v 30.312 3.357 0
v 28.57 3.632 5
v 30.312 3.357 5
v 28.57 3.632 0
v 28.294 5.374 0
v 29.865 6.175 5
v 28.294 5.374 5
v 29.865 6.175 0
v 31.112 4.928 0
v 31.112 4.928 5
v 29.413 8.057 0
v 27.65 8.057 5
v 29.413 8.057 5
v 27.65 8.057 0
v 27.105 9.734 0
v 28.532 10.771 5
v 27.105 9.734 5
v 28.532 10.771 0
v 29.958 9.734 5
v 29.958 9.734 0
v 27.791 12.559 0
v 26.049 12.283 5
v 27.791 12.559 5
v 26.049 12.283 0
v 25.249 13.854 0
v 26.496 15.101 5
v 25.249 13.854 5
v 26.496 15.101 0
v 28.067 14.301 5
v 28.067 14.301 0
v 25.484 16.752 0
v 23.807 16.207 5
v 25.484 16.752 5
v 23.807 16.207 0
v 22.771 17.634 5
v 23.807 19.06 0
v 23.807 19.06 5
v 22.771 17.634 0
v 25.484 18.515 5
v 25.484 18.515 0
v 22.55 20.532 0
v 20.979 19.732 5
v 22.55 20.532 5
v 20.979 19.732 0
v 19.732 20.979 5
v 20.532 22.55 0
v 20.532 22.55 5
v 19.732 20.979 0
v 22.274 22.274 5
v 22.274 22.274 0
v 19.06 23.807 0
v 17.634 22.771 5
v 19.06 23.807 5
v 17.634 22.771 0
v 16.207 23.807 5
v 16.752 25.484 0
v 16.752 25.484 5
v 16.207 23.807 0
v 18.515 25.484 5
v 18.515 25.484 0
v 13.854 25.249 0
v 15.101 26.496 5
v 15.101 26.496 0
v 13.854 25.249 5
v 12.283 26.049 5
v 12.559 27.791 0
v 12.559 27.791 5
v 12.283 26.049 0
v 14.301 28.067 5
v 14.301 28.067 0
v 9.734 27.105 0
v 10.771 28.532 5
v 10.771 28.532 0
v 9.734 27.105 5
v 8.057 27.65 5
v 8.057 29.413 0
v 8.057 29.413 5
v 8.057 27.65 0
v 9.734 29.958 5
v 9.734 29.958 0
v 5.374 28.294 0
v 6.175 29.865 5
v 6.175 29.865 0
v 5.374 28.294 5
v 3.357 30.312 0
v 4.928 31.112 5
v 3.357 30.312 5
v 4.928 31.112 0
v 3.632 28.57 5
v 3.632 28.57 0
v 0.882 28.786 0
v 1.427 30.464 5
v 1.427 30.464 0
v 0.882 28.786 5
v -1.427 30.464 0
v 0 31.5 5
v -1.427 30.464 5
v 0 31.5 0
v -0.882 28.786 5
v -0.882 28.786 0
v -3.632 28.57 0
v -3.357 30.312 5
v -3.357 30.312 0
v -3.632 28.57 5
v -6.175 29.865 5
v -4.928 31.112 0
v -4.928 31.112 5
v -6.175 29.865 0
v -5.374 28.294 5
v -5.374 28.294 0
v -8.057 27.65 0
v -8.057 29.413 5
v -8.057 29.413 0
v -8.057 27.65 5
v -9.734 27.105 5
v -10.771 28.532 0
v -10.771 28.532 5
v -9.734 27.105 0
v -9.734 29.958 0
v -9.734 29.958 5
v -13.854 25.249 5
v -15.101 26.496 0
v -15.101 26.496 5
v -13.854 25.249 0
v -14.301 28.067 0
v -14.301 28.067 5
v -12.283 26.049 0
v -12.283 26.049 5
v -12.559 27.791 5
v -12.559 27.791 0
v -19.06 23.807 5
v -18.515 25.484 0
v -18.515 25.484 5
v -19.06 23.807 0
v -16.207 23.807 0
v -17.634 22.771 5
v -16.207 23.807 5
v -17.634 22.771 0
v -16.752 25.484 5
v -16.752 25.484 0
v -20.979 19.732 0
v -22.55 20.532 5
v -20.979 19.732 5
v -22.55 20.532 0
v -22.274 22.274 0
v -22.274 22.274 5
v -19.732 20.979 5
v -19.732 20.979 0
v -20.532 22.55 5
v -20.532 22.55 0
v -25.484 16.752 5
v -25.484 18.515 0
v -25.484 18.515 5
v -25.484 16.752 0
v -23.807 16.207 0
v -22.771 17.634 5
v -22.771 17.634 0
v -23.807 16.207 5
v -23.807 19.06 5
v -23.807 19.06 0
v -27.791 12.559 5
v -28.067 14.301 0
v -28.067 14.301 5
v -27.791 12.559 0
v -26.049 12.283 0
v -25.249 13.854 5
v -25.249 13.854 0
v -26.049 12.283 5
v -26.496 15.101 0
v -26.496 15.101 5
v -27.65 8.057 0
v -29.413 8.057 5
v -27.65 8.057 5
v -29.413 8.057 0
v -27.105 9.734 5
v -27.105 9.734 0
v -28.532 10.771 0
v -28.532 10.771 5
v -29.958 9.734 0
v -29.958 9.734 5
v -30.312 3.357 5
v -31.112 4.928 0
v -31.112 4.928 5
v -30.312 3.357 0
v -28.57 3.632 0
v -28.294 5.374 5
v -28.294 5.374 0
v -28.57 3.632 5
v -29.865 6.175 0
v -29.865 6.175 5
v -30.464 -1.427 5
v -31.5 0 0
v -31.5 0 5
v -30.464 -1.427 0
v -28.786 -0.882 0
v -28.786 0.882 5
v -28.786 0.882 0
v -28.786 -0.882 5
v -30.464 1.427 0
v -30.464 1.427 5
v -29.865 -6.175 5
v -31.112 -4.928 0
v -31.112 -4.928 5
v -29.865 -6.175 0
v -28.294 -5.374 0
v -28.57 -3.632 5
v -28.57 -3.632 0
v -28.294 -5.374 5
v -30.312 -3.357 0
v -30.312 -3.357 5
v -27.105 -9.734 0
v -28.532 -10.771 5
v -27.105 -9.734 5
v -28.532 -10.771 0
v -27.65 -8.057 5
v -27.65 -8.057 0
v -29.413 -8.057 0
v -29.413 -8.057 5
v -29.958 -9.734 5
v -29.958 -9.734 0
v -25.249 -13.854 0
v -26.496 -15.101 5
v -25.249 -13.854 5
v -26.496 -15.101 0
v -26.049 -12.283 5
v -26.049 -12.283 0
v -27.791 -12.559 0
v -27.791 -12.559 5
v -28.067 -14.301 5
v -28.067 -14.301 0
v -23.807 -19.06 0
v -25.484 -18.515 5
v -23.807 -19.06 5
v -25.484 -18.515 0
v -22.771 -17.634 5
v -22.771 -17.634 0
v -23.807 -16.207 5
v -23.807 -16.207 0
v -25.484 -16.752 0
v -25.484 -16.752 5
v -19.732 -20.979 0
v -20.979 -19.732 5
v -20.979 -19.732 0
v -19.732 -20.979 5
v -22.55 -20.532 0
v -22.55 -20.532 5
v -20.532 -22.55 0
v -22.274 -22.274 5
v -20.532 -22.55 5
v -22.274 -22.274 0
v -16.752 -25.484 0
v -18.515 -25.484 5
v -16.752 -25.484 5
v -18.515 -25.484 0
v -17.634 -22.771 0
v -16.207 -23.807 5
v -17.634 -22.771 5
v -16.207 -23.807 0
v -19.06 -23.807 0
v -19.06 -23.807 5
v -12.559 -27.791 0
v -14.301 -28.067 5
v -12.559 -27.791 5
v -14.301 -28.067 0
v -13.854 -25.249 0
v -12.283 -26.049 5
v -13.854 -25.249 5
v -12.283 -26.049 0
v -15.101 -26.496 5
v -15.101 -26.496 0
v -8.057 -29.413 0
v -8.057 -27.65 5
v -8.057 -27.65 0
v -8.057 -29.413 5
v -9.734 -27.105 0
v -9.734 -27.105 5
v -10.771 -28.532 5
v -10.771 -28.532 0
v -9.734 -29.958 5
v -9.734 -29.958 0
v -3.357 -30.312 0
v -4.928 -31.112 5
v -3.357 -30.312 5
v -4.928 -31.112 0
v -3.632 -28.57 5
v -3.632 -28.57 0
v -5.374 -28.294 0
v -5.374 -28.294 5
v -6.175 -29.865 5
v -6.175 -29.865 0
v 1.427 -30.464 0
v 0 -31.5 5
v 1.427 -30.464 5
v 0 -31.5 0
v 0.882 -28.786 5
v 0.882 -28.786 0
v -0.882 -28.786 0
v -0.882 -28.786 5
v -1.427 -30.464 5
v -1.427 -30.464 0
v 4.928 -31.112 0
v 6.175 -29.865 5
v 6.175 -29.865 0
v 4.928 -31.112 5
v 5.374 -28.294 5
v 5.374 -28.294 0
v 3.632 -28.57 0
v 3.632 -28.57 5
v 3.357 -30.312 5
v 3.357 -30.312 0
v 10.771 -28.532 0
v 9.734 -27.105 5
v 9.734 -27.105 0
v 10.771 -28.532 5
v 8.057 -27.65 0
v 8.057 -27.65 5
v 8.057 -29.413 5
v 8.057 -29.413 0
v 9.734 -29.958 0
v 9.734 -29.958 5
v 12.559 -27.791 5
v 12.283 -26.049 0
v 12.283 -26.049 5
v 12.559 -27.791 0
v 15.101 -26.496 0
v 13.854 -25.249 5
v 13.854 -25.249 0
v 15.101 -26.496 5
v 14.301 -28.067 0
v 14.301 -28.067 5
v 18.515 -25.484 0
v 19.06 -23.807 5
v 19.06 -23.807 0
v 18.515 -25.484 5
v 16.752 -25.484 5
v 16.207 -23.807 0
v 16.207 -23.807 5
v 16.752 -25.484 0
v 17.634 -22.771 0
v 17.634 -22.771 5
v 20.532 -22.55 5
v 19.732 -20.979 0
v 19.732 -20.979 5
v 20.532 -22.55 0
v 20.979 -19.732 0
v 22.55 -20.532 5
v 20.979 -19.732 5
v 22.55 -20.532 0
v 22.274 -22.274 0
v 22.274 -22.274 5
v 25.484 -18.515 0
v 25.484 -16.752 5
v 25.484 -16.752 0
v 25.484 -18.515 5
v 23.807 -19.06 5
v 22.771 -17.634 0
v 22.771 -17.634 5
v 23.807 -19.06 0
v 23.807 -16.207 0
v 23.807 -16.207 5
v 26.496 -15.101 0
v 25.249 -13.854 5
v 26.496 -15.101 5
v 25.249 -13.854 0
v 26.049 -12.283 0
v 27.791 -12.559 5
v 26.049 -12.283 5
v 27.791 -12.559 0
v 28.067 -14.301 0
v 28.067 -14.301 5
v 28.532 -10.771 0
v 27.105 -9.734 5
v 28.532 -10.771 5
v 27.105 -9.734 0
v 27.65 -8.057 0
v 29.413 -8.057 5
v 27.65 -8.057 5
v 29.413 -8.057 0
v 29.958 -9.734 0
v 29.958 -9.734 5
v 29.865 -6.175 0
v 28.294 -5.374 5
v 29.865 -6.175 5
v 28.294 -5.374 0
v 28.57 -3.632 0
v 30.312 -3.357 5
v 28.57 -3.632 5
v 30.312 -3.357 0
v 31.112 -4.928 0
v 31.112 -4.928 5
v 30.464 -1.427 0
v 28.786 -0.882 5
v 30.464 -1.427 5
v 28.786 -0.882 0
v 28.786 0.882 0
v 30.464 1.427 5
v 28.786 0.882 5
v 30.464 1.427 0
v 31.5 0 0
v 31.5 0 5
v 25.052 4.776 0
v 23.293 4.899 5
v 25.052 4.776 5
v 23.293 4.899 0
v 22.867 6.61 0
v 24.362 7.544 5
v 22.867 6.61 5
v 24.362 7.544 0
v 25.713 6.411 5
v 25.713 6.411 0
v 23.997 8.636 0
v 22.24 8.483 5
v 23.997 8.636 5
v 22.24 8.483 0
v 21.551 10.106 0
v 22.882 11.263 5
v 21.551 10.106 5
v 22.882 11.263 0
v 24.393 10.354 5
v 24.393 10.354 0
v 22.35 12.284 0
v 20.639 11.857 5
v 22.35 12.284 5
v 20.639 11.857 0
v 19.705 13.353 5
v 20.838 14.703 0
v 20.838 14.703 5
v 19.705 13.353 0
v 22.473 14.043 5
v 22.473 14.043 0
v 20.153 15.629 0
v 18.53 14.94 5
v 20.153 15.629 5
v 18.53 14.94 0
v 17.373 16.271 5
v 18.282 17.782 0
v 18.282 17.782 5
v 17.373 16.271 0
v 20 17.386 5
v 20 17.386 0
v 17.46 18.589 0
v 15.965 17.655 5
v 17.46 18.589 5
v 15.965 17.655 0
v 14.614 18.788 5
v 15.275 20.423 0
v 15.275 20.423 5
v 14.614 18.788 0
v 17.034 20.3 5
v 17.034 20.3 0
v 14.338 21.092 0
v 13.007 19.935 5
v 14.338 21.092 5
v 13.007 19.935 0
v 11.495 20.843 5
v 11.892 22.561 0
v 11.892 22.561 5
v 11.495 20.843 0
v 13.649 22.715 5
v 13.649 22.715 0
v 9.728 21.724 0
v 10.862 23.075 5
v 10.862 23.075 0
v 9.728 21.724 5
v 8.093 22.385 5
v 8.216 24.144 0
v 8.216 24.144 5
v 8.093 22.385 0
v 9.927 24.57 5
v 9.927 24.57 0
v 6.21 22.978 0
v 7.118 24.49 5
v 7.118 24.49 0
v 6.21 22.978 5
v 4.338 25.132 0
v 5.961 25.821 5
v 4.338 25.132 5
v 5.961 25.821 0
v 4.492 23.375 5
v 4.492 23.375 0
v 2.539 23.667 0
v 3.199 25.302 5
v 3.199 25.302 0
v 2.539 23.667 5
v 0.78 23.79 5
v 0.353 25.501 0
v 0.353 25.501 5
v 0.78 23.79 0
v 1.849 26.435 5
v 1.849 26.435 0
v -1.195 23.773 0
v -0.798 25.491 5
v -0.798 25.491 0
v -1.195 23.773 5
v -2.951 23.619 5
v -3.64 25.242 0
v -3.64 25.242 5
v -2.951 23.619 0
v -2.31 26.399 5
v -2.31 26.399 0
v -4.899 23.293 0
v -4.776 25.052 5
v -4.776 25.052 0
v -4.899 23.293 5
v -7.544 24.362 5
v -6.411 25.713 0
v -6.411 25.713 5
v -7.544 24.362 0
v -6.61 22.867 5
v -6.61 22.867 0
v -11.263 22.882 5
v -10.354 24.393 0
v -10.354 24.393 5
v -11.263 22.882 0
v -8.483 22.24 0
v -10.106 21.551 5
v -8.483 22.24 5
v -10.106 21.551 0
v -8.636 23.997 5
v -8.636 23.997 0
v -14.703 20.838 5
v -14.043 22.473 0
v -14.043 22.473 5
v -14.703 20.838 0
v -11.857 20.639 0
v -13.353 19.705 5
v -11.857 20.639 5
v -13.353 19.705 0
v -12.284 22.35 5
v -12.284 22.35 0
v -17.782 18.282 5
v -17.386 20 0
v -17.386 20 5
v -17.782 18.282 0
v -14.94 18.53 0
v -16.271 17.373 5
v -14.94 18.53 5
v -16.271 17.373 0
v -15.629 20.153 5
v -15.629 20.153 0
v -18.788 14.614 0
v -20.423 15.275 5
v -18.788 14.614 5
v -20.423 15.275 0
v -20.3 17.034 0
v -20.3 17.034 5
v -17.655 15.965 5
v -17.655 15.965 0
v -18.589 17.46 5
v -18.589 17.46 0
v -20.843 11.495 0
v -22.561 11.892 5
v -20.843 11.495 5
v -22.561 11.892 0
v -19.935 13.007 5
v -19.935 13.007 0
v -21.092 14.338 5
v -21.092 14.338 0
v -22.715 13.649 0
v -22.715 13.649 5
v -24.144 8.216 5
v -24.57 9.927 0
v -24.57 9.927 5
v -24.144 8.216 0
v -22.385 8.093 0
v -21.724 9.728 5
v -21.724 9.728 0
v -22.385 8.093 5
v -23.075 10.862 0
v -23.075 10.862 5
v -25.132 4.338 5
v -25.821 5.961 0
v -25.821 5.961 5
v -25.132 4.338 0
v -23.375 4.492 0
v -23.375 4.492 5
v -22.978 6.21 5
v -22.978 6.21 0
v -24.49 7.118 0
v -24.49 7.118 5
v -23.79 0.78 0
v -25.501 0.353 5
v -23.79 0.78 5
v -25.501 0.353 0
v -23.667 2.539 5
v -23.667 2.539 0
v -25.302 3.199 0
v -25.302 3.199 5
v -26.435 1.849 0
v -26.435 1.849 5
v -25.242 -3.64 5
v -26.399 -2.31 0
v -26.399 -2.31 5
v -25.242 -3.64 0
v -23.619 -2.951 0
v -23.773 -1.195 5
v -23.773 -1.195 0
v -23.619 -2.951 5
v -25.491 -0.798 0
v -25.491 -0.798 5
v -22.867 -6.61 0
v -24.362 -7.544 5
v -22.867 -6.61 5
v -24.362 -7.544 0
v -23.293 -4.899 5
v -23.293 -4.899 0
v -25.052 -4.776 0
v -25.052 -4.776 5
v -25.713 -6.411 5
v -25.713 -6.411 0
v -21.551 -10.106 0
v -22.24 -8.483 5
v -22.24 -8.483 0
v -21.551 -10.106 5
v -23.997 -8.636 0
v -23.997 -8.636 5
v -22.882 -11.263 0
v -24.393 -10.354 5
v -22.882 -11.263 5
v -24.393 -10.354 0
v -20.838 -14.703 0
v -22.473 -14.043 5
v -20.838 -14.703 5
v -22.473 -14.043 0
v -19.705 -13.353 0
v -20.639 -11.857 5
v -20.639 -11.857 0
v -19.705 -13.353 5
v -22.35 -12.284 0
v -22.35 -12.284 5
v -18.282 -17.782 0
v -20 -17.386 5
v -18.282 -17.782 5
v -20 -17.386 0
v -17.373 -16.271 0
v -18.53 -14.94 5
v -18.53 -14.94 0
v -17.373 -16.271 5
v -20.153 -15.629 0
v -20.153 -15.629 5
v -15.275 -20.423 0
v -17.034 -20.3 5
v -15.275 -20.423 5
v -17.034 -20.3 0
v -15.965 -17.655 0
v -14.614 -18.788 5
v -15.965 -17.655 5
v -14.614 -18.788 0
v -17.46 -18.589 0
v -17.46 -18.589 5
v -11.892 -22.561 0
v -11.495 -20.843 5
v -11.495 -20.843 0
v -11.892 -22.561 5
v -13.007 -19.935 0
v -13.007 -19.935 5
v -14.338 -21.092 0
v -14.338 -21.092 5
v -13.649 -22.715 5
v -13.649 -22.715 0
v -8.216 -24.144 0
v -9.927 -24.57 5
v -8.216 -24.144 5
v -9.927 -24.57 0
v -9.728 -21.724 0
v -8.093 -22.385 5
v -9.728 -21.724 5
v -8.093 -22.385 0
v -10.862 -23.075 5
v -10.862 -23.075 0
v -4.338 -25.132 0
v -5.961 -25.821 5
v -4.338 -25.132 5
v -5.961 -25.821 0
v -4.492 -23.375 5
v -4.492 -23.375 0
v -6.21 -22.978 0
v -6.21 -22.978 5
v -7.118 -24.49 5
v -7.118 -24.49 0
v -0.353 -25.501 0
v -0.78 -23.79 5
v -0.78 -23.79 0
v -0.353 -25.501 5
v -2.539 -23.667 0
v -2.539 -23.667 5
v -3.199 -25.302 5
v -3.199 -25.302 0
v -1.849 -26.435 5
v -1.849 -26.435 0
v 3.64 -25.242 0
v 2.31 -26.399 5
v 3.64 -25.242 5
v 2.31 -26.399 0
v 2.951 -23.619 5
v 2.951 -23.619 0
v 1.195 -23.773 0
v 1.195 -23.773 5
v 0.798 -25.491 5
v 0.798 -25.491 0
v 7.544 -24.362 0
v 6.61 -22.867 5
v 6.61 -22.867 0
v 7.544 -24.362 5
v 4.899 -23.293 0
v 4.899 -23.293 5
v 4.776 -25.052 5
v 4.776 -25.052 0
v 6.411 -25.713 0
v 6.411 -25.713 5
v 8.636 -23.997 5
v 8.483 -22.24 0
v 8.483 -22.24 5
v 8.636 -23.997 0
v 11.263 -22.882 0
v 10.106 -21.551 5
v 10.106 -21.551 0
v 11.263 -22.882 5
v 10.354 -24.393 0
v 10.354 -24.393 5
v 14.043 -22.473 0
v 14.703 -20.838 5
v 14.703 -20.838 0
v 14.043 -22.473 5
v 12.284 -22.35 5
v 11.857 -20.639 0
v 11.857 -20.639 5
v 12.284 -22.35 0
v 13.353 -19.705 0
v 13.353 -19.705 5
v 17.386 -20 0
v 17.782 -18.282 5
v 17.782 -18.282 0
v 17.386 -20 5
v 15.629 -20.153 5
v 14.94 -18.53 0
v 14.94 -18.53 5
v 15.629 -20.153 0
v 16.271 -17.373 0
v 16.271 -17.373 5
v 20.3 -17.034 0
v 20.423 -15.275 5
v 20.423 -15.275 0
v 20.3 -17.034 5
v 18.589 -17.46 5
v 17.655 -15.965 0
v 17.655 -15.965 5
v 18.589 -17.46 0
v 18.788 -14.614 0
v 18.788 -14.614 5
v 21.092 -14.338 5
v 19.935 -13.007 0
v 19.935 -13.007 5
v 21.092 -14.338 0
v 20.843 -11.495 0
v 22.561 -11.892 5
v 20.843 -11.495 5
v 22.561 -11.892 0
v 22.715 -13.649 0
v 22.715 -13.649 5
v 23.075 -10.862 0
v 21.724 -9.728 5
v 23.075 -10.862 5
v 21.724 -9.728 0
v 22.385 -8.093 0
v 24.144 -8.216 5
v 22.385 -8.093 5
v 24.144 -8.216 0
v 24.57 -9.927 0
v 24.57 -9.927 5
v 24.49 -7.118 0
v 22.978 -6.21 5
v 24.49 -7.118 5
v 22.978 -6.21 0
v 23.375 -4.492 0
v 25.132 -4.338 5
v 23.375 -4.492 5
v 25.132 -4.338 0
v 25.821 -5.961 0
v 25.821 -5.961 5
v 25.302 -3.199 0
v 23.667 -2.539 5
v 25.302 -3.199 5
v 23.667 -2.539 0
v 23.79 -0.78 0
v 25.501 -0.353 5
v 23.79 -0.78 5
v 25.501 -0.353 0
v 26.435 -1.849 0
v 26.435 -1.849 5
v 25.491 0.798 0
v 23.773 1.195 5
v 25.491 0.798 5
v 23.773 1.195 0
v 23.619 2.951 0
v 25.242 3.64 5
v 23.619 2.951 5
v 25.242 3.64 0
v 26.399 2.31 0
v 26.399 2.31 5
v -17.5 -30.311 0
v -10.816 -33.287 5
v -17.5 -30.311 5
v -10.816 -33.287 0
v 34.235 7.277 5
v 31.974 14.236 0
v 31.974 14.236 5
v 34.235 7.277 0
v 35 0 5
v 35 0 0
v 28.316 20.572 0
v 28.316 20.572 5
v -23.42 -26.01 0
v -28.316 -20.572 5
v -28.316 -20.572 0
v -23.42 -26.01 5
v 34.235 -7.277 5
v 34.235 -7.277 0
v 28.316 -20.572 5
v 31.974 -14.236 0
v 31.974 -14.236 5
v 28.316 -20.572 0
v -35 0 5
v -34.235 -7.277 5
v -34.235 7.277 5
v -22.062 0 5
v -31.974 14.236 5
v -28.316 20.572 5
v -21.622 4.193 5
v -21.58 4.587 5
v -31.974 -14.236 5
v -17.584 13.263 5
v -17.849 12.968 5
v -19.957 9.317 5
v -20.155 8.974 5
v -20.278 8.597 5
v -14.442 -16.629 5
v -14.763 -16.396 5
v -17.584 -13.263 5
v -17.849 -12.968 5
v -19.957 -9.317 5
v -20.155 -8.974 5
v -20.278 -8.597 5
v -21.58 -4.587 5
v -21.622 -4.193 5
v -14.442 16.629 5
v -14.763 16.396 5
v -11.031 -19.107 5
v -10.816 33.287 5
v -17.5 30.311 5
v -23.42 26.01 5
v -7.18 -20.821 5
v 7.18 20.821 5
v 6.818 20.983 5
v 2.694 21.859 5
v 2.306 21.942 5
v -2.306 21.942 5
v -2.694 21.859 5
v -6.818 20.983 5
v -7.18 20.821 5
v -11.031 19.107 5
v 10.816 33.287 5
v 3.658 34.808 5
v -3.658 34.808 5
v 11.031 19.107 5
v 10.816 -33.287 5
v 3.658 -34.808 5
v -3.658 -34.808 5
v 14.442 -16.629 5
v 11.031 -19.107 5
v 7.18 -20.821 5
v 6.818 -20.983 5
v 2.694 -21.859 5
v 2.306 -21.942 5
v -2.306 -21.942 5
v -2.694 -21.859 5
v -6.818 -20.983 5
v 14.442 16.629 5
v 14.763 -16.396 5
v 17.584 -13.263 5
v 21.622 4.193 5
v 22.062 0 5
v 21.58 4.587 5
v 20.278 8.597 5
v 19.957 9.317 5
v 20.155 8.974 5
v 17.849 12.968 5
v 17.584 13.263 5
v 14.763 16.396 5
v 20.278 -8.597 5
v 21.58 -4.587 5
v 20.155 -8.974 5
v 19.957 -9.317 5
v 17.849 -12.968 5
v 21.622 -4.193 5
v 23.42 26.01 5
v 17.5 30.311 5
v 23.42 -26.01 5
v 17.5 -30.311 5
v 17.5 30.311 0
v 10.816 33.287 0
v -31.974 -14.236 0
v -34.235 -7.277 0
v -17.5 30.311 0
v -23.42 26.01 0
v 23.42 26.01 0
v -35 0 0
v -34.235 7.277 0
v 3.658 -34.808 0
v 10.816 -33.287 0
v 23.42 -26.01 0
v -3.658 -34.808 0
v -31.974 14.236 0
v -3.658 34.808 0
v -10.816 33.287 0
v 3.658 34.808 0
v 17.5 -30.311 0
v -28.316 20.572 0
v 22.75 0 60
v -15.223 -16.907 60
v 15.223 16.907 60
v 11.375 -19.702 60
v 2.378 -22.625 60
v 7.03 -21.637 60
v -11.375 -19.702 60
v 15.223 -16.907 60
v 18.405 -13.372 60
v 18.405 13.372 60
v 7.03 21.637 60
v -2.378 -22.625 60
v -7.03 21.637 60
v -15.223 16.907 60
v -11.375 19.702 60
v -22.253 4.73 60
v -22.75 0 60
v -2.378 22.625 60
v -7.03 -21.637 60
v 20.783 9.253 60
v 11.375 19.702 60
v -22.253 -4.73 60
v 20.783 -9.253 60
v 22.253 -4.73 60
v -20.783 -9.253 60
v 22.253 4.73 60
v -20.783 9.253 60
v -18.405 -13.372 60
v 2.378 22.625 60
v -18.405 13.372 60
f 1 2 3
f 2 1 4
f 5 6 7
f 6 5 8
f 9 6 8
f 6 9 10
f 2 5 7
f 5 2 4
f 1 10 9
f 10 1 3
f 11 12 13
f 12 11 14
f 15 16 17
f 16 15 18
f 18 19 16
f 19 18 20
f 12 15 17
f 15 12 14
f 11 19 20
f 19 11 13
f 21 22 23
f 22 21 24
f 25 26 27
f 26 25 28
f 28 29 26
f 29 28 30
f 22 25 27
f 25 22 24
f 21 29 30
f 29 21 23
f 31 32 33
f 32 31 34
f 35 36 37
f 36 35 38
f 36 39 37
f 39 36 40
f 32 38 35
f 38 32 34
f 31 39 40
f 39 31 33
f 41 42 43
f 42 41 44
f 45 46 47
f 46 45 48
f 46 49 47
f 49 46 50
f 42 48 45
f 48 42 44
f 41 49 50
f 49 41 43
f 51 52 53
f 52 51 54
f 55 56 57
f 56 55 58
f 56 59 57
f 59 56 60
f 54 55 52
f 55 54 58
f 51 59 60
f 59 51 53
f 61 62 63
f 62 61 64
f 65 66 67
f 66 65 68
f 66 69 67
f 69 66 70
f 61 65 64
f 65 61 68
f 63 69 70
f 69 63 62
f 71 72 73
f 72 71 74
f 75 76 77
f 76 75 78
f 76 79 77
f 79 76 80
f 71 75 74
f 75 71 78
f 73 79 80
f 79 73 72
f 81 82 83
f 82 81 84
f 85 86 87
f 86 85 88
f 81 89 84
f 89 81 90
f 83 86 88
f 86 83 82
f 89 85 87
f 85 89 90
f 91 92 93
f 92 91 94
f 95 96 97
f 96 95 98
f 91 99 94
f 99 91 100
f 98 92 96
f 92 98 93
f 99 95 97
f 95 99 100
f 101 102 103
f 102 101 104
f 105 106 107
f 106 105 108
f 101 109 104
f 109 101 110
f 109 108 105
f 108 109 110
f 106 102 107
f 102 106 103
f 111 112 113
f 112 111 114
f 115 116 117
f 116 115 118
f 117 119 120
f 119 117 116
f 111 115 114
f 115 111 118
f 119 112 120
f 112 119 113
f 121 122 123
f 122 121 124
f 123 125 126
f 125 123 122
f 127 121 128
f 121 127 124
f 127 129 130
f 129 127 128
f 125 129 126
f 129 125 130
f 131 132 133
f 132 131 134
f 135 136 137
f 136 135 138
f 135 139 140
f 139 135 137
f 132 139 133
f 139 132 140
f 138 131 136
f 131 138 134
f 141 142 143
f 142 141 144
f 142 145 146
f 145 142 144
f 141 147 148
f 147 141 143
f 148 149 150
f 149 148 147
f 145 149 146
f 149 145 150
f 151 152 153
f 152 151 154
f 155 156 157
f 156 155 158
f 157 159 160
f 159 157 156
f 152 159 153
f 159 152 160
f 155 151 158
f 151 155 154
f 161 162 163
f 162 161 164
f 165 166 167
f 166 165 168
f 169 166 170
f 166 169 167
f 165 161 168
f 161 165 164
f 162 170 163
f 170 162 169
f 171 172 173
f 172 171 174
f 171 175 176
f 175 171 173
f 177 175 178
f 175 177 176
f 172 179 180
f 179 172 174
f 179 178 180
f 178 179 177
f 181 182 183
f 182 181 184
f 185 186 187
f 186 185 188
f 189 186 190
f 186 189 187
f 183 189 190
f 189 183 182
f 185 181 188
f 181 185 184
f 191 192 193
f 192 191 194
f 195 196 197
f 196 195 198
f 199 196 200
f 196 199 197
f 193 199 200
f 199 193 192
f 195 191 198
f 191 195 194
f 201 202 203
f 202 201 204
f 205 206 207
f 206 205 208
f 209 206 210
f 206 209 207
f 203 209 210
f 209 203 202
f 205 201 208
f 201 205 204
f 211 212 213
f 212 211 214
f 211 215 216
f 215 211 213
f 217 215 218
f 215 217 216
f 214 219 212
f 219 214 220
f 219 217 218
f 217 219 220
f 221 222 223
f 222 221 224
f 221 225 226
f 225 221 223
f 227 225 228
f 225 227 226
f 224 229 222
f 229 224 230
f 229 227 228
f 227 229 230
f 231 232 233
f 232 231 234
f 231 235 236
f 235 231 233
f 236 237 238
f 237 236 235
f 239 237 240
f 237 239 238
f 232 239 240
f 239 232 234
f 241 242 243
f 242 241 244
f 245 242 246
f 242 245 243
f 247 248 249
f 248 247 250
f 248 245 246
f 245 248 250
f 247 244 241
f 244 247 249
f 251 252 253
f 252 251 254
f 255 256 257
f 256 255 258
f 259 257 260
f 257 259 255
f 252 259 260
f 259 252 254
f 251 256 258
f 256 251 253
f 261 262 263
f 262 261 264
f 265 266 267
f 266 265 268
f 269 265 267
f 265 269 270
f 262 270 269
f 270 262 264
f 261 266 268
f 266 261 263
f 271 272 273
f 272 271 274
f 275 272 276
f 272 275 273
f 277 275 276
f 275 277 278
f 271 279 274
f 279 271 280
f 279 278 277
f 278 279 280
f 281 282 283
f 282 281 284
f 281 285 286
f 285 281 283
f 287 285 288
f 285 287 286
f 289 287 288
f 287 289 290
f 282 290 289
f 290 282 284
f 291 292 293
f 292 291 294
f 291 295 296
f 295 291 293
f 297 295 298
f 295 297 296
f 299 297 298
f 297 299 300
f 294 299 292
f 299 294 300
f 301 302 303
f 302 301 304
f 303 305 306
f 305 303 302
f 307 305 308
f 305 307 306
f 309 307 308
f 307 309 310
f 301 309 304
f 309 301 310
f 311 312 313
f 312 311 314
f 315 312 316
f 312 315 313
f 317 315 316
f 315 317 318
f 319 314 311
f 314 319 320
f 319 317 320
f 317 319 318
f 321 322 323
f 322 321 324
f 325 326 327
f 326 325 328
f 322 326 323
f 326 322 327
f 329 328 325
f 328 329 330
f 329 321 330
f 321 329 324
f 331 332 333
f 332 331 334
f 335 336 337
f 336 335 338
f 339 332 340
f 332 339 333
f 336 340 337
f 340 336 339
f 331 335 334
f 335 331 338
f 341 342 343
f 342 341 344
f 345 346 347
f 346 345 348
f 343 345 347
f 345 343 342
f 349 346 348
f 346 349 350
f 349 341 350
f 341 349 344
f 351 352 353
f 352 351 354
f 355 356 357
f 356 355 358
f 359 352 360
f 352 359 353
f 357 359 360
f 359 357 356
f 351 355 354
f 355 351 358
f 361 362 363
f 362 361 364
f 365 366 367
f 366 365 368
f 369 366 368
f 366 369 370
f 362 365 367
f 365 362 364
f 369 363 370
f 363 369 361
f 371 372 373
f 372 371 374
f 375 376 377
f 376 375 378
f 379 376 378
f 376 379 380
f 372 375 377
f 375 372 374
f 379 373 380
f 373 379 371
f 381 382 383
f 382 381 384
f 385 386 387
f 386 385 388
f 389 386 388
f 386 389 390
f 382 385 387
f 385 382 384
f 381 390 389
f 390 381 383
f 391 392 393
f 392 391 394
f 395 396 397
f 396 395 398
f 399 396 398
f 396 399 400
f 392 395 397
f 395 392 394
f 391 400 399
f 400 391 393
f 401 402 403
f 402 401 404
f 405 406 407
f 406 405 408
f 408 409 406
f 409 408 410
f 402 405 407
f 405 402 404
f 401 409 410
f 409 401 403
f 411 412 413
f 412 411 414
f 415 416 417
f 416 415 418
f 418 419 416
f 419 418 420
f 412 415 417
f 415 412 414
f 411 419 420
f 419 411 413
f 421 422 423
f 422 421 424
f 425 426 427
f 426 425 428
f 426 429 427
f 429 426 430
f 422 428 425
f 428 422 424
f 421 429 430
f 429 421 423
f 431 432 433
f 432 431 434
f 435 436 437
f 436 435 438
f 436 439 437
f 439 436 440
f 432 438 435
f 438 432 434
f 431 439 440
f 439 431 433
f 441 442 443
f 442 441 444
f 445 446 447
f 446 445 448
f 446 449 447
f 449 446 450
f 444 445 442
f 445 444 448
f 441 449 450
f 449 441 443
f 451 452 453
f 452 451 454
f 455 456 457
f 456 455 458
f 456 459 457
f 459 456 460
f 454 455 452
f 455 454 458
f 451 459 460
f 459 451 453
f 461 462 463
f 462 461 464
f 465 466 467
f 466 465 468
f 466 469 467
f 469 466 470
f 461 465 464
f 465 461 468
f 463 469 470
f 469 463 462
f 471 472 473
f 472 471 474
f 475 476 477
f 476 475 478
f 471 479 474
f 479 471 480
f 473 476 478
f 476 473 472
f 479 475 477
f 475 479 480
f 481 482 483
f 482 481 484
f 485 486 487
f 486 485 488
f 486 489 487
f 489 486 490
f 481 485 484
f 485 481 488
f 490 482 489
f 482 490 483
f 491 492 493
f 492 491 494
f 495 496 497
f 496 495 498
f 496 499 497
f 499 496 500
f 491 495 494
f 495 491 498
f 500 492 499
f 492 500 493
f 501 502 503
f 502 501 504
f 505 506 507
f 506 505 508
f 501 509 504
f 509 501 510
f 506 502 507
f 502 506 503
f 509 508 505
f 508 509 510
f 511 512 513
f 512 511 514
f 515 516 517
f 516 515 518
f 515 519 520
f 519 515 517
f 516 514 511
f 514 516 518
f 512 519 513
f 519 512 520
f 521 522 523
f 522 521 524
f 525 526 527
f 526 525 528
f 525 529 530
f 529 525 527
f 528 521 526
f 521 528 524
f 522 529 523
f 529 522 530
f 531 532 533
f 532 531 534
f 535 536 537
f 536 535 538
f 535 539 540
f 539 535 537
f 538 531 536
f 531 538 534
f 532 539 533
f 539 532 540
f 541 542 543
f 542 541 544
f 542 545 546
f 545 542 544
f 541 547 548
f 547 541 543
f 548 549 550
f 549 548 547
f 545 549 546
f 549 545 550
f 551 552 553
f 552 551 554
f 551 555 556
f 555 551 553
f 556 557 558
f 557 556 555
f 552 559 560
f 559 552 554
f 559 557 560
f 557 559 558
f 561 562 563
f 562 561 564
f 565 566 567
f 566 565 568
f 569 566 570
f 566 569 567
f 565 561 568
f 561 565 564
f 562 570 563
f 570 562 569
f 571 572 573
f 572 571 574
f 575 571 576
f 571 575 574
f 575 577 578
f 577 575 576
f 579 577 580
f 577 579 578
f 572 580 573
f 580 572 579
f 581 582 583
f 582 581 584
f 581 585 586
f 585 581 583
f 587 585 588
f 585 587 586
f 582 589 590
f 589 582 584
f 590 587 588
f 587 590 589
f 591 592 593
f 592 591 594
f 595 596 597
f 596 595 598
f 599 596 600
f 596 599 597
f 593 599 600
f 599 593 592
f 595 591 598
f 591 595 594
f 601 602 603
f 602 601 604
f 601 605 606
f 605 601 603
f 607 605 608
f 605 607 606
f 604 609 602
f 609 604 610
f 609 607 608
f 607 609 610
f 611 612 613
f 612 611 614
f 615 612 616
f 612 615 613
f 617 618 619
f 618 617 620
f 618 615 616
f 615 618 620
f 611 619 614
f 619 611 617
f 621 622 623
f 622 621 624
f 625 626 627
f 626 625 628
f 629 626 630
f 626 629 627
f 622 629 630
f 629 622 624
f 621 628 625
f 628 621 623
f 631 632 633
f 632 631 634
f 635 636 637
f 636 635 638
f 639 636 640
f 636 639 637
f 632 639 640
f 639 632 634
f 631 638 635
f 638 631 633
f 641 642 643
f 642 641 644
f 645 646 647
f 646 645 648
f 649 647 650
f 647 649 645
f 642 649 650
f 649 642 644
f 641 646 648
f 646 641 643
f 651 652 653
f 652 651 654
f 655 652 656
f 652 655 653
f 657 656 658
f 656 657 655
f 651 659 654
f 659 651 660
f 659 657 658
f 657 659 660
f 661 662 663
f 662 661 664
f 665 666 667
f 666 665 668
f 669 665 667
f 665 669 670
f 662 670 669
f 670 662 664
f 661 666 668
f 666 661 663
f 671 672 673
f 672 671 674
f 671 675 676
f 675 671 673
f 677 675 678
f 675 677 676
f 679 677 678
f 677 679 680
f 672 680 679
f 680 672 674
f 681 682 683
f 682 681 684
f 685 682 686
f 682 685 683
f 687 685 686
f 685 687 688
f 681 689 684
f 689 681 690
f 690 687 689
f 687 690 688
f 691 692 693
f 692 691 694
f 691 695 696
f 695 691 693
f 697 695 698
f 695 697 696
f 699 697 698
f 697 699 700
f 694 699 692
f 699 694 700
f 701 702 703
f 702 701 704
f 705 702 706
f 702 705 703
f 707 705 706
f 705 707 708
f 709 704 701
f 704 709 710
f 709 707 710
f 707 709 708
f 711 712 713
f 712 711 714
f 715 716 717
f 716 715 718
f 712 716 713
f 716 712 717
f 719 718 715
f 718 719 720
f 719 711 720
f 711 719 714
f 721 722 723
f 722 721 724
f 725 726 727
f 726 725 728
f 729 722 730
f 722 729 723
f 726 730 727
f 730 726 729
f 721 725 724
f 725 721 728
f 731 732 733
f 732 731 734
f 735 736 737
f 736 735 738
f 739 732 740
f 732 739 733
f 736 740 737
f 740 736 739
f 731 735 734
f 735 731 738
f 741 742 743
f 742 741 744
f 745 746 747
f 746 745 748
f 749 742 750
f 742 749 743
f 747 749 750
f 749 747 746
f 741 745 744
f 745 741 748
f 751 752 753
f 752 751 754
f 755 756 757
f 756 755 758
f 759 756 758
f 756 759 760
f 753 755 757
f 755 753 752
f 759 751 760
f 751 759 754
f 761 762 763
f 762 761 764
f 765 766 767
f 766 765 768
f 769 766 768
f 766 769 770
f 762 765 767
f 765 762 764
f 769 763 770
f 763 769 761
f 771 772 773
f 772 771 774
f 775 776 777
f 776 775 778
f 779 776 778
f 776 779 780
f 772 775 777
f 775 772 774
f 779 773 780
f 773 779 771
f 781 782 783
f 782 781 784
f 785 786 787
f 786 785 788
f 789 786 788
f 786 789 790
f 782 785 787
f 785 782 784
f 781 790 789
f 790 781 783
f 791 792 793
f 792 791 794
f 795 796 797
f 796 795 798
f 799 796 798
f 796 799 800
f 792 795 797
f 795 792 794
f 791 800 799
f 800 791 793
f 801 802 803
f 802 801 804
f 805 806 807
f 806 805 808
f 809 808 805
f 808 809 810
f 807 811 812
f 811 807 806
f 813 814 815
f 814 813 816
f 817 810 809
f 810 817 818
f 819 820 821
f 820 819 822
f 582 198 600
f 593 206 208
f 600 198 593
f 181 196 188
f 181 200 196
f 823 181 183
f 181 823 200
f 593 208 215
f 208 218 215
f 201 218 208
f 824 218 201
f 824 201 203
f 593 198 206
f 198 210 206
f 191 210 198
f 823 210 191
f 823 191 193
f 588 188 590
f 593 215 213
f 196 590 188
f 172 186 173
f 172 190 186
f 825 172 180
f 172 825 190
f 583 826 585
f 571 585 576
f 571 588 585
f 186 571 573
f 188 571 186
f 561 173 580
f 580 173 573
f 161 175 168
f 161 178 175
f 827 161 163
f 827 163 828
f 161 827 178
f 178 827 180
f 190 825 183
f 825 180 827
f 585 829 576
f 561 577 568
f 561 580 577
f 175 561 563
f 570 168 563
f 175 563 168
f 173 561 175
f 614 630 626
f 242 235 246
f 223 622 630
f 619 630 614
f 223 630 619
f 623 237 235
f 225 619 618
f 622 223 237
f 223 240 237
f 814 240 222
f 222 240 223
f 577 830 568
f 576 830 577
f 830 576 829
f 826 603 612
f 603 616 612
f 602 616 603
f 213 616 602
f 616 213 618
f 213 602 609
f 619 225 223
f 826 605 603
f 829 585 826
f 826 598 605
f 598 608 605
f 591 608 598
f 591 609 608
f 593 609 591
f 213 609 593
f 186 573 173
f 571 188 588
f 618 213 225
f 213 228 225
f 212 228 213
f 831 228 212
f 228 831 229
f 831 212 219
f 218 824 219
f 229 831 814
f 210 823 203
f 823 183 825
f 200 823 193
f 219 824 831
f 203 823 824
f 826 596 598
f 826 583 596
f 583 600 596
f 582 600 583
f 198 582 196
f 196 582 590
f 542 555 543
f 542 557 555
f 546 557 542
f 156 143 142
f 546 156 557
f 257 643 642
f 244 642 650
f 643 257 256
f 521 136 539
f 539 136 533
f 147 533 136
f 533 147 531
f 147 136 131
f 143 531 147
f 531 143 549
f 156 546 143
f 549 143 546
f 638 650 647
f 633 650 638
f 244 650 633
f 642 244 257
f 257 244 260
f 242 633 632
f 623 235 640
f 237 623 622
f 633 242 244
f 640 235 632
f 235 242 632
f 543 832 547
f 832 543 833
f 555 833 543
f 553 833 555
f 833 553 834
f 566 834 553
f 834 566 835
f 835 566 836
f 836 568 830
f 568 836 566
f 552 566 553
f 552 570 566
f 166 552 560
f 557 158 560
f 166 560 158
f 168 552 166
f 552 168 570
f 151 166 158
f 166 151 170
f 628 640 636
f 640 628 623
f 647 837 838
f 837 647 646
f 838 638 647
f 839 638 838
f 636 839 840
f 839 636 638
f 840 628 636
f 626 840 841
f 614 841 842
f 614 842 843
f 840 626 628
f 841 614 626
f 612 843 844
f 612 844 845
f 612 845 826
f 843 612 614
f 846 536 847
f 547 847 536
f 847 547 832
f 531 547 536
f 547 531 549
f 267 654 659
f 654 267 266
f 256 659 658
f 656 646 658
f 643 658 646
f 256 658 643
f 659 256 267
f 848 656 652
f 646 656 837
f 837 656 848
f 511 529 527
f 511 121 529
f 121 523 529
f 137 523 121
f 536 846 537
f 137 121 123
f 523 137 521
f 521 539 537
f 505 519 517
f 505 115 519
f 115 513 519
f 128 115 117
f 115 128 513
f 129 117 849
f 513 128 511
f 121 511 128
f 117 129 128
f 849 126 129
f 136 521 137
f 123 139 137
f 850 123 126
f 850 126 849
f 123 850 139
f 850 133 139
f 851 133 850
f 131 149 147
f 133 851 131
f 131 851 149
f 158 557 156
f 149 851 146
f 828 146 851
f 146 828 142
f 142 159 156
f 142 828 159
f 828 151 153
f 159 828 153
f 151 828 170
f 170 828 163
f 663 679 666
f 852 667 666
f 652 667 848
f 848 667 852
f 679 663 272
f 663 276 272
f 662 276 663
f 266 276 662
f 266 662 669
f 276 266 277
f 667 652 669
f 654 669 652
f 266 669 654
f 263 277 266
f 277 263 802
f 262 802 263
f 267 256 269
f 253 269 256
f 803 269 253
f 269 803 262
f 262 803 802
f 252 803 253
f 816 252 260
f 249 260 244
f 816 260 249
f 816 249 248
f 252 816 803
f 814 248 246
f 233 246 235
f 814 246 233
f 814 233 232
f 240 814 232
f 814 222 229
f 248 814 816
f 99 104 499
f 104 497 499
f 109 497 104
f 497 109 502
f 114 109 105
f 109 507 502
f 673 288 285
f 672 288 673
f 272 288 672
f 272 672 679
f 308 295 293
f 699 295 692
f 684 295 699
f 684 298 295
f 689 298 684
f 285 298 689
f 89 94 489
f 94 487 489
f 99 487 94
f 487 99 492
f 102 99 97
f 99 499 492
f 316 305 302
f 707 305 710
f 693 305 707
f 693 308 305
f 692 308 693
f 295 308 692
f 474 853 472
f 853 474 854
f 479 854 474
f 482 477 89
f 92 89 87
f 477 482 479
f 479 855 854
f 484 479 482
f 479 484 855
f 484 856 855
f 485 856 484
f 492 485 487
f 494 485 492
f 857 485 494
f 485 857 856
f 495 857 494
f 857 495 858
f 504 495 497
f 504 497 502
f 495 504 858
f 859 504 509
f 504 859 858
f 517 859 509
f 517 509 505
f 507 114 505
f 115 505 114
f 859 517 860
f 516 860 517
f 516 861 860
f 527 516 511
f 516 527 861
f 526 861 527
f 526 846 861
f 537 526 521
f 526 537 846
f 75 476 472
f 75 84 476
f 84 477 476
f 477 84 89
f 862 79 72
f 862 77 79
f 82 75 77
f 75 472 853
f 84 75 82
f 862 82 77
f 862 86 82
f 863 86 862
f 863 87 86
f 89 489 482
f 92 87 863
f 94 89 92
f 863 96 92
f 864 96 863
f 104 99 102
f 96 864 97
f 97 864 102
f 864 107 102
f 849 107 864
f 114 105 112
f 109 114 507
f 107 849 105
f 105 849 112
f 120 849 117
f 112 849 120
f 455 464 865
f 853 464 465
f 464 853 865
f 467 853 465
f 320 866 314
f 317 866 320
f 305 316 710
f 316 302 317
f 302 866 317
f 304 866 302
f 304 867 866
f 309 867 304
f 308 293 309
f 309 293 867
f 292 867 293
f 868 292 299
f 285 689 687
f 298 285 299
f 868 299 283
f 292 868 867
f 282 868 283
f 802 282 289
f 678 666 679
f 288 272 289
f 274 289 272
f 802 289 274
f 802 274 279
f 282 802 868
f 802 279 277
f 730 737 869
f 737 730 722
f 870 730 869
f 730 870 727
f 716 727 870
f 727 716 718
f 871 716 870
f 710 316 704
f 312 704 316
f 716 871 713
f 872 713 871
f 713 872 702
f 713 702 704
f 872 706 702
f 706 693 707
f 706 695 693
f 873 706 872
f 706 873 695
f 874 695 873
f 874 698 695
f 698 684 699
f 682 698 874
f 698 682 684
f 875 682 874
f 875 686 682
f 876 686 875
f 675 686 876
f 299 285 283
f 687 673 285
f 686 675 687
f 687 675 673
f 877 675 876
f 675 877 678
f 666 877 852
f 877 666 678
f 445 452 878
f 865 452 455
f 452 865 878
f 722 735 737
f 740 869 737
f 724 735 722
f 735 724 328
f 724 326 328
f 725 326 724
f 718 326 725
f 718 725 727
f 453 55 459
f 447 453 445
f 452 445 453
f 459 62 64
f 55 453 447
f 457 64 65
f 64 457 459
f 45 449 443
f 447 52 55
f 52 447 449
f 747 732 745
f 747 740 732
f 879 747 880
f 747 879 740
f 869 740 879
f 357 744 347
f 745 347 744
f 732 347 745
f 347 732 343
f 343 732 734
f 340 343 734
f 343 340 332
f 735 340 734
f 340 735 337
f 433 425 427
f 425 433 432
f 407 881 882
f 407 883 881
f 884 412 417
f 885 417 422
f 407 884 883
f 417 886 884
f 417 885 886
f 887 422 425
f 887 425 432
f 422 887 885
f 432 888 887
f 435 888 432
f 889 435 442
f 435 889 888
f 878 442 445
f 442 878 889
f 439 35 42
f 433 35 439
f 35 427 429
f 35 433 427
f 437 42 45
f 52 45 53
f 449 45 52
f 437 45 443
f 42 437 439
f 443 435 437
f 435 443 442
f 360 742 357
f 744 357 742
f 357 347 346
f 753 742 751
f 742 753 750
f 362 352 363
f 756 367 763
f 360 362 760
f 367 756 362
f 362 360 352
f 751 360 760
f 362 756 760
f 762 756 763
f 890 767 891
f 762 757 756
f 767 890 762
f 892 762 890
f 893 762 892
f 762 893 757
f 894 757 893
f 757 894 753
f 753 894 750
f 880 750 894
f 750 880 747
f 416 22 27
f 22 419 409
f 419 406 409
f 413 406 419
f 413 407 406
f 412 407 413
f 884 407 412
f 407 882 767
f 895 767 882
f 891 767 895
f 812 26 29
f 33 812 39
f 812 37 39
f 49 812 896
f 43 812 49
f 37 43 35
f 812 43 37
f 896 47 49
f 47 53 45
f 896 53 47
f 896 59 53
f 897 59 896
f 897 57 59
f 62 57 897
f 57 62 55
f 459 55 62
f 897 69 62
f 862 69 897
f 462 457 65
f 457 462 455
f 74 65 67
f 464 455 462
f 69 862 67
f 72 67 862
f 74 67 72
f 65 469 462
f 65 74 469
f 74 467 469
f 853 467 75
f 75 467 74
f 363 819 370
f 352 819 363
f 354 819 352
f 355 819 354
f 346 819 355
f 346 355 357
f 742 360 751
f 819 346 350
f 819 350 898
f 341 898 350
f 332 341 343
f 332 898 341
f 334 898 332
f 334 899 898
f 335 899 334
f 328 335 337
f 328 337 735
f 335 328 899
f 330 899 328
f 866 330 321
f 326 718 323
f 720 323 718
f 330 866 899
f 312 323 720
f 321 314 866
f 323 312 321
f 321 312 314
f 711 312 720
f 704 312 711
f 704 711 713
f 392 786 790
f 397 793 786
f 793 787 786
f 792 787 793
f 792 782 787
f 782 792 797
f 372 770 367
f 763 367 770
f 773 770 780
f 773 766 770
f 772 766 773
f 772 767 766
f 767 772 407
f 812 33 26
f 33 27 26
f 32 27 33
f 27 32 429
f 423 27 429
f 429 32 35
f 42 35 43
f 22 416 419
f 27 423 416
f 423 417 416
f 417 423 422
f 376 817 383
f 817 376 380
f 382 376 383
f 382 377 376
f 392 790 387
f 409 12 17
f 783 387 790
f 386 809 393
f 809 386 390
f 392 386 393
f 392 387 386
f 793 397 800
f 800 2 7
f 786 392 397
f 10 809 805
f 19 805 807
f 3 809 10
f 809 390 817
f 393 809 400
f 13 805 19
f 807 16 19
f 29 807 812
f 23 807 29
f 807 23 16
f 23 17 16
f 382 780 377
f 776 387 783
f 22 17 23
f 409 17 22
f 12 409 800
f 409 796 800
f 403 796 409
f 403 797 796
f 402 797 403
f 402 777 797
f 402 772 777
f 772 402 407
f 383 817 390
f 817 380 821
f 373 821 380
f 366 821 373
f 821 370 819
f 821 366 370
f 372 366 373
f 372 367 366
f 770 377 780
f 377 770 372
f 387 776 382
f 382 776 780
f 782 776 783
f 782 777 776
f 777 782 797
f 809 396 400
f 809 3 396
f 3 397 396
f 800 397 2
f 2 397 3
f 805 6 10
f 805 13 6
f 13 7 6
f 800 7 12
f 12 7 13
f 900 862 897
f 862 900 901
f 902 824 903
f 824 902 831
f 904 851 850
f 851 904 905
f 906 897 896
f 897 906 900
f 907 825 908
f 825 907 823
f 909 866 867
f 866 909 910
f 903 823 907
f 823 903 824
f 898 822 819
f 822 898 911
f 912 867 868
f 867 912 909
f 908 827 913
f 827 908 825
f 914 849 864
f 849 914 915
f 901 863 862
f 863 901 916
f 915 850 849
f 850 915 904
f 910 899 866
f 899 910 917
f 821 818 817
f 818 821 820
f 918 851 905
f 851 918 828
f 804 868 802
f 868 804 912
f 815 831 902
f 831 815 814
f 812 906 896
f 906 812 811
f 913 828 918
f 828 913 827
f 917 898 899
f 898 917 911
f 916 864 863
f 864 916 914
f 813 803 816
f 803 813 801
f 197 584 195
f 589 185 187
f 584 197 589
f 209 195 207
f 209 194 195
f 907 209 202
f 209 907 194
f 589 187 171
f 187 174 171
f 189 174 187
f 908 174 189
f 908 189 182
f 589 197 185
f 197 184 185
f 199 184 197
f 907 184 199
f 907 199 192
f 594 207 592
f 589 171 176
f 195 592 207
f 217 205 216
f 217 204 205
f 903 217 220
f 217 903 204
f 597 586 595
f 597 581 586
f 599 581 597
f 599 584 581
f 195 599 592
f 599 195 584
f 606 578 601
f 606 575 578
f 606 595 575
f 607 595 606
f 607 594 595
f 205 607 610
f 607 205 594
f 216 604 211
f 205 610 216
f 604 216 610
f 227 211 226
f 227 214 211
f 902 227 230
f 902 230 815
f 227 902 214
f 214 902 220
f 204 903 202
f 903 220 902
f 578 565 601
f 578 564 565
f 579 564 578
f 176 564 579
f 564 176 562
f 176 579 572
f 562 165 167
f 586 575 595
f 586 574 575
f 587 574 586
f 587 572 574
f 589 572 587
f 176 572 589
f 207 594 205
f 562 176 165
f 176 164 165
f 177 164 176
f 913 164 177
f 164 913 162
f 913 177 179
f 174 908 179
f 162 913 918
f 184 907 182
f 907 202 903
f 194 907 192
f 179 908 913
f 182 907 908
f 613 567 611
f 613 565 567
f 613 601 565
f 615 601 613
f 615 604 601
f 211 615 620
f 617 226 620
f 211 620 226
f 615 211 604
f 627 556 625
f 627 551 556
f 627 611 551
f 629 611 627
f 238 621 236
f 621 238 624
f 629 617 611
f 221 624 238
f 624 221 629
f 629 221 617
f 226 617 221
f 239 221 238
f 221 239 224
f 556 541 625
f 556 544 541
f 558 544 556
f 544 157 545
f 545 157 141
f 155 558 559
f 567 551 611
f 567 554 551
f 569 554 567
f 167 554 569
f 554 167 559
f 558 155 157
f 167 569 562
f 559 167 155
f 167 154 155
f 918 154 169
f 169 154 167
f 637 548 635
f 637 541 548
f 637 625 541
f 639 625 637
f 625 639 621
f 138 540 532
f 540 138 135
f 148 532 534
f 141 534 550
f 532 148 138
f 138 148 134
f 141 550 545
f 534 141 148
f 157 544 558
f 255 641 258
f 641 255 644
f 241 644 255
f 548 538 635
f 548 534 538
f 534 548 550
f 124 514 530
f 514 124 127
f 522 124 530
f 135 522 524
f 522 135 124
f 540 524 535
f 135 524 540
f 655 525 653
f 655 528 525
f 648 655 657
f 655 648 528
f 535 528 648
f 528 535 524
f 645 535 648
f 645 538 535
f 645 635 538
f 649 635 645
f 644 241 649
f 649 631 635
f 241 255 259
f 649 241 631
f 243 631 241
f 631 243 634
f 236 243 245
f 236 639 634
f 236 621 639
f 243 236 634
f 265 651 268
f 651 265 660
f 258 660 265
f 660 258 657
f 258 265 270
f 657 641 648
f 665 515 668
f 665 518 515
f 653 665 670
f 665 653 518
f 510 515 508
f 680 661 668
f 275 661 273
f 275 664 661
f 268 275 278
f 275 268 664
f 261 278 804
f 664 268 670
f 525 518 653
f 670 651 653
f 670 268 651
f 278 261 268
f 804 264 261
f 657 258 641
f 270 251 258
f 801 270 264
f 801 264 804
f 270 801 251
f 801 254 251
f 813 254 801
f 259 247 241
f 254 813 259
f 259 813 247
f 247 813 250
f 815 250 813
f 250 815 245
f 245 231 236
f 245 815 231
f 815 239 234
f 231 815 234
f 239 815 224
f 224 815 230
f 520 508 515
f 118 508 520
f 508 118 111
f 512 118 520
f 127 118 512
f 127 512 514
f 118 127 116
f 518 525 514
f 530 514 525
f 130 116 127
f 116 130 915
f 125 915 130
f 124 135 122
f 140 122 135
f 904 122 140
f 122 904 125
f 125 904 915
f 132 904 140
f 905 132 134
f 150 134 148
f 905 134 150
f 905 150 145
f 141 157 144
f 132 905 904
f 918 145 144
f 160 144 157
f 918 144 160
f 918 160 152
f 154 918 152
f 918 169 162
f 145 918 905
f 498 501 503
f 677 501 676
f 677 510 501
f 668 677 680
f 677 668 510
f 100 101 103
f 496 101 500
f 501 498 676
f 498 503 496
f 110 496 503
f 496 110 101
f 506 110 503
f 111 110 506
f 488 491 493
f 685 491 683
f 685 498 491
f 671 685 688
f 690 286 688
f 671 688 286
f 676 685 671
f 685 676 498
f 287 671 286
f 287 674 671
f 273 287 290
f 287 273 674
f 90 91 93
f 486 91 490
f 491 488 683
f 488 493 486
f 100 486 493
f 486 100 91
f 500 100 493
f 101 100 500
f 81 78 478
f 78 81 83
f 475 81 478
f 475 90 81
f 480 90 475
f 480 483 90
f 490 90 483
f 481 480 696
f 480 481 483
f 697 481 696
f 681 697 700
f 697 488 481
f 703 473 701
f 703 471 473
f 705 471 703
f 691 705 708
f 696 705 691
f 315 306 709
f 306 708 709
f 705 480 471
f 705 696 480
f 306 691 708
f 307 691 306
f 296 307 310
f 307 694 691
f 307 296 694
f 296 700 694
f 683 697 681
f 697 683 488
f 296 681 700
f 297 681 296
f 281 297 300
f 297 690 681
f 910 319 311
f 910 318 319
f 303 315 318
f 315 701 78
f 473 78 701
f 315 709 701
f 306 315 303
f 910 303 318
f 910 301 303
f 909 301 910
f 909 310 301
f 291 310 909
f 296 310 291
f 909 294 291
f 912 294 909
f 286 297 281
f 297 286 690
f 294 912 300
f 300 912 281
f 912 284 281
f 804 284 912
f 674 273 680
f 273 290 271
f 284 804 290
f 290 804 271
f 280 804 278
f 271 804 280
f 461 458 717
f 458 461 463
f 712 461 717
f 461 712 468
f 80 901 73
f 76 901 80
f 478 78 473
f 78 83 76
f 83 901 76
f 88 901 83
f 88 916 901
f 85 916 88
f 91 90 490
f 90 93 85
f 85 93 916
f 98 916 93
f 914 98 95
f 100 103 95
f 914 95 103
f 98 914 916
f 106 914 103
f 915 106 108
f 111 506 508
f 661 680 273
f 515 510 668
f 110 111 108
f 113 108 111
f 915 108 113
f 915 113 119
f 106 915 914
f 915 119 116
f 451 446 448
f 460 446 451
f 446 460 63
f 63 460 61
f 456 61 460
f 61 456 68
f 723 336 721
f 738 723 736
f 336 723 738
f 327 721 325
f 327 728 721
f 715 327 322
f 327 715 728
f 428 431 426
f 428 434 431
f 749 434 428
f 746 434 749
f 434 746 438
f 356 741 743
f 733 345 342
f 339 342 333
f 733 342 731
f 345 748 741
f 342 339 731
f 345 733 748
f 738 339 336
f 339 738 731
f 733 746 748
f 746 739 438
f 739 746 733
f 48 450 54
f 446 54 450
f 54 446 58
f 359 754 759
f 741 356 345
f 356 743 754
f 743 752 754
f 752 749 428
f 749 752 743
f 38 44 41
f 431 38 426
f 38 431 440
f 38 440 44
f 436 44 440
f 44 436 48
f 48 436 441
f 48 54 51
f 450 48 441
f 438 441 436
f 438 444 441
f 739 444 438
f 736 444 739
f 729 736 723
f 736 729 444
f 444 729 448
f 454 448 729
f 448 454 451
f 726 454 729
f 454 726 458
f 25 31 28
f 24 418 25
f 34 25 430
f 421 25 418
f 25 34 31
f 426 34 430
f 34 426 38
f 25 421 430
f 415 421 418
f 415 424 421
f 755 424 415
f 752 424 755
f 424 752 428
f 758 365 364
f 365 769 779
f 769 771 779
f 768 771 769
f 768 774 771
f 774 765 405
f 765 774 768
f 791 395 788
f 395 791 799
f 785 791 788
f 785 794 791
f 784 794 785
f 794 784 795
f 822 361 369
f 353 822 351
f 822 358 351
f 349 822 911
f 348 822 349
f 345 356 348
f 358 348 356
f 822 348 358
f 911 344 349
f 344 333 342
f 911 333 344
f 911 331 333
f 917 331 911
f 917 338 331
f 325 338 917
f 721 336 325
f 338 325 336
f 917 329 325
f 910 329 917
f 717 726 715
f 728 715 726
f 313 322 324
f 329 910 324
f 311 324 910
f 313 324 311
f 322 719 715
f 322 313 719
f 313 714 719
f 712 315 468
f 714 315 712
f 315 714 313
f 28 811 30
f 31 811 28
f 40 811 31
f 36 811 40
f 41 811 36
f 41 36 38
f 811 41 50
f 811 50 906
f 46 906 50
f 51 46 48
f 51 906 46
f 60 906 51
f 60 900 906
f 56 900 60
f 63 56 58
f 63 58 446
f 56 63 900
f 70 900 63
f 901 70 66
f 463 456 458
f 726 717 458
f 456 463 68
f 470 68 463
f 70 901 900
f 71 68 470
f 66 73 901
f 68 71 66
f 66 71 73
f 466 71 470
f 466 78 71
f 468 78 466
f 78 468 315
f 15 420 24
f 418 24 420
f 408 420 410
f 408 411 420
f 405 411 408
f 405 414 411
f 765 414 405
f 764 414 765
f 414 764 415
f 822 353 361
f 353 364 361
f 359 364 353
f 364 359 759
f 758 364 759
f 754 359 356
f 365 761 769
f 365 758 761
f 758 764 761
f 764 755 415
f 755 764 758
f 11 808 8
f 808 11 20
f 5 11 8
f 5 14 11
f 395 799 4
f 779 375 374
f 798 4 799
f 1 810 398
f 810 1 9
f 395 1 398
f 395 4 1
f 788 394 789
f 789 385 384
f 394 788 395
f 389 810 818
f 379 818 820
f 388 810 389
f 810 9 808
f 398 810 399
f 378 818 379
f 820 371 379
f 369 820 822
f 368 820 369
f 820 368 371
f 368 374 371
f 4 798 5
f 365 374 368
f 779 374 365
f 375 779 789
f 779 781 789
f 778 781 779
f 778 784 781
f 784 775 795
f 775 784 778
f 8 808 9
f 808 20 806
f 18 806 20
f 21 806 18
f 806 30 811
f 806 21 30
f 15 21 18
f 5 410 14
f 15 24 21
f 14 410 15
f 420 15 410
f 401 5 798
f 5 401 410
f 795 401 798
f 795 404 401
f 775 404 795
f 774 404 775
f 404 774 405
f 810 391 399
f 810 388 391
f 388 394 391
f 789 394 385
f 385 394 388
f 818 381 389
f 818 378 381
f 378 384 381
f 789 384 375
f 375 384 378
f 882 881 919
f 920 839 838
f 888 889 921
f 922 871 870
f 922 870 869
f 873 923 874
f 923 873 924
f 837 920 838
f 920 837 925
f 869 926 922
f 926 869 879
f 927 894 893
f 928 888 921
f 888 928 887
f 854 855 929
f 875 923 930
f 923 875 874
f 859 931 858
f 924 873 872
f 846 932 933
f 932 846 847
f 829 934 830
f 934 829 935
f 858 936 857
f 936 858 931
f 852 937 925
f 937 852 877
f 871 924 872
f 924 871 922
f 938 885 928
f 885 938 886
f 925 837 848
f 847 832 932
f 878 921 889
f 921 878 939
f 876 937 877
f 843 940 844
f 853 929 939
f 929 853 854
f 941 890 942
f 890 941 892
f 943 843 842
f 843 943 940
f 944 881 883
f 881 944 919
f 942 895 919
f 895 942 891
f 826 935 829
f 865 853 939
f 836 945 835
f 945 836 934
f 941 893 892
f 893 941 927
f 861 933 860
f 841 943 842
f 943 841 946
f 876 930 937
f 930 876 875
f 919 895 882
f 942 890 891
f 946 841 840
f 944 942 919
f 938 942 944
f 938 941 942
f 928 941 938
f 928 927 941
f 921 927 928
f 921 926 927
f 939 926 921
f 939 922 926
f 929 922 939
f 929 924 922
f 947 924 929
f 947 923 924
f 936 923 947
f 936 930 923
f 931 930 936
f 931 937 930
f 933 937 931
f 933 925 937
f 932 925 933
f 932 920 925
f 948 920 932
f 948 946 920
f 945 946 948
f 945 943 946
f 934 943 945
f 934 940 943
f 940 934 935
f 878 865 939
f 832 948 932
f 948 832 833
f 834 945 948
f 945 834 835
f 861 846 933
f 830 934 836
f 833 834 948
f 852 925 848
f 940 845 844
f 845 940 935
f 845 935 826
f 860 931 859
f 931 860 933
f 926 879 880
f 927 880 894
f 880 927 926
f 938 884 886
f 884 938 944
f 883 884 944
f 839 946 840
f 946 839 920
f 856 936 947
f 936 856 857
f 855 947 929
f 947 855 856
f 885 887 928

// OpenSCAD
// supposed to be printed with 3 0.7mm perimeters
// no infill. no top and bottom layers

flange(d=40);

module basic(){
    cylinder(h=50+10,r1=44/2+2, r2=45.5/2+2);
    hull(){
        cylinder(h=5,r2=44/2+2, r1=45.5/2+2);
        
        translate([0,0,-70]) hull(){
            for(i=[-1,1]) translate([i*20,0,0]) cylinder(h=10,r=8);
        }
    }
}


module nidle(){
    cylinder(h=50+10,r1=44/2+2, r2=45.5/2+2);
    hull(){
        cylinder(h=5,r2=44/2+2, r1=45.5/2+2);
        
        translate([0,0,-170]) hull(){
            for(i=[-1,1]) translate([i*5,0,0]) cylinder(h=50,r=5);
        }
    }

}

module flange(d=44){
    cylinder(h=50+10,r1=d/2+2, r2=(d+1.5)/2+2);
    difference(){
        cylinder(h=5,r=35);
        N=40;
        for(i=[1:N]) rotate(360/N*i) translate([30,0,0]) cylinder(h=20,r=1.5, center=true);
        for(i=[1:N]) rotate(360/N*i+5) translate([25,0,0]) cylinder(h=20,r=1.5, center=true);    
    }
    
}

module polishing_adapter(){
    cylinder(h=30+10,r1=44/2+2, r2=45.5/2+2);
    rotate([180,0,0]) cylinder(h=20+10,r1=44/2+2-1, r2=45.5/2+2-1);
}

/*
    cylinder(h=30+10,r1=44/2+2, r2=45.5/2+2);
    rotate([180,0,0]) hull(){
        cylinder(h=20+10,r=44/2+2);
        translate([0,0,8])cylinder(h=20+10,r1=44/2+2+3, r2=45.5/2+2+3);
    }
*/
